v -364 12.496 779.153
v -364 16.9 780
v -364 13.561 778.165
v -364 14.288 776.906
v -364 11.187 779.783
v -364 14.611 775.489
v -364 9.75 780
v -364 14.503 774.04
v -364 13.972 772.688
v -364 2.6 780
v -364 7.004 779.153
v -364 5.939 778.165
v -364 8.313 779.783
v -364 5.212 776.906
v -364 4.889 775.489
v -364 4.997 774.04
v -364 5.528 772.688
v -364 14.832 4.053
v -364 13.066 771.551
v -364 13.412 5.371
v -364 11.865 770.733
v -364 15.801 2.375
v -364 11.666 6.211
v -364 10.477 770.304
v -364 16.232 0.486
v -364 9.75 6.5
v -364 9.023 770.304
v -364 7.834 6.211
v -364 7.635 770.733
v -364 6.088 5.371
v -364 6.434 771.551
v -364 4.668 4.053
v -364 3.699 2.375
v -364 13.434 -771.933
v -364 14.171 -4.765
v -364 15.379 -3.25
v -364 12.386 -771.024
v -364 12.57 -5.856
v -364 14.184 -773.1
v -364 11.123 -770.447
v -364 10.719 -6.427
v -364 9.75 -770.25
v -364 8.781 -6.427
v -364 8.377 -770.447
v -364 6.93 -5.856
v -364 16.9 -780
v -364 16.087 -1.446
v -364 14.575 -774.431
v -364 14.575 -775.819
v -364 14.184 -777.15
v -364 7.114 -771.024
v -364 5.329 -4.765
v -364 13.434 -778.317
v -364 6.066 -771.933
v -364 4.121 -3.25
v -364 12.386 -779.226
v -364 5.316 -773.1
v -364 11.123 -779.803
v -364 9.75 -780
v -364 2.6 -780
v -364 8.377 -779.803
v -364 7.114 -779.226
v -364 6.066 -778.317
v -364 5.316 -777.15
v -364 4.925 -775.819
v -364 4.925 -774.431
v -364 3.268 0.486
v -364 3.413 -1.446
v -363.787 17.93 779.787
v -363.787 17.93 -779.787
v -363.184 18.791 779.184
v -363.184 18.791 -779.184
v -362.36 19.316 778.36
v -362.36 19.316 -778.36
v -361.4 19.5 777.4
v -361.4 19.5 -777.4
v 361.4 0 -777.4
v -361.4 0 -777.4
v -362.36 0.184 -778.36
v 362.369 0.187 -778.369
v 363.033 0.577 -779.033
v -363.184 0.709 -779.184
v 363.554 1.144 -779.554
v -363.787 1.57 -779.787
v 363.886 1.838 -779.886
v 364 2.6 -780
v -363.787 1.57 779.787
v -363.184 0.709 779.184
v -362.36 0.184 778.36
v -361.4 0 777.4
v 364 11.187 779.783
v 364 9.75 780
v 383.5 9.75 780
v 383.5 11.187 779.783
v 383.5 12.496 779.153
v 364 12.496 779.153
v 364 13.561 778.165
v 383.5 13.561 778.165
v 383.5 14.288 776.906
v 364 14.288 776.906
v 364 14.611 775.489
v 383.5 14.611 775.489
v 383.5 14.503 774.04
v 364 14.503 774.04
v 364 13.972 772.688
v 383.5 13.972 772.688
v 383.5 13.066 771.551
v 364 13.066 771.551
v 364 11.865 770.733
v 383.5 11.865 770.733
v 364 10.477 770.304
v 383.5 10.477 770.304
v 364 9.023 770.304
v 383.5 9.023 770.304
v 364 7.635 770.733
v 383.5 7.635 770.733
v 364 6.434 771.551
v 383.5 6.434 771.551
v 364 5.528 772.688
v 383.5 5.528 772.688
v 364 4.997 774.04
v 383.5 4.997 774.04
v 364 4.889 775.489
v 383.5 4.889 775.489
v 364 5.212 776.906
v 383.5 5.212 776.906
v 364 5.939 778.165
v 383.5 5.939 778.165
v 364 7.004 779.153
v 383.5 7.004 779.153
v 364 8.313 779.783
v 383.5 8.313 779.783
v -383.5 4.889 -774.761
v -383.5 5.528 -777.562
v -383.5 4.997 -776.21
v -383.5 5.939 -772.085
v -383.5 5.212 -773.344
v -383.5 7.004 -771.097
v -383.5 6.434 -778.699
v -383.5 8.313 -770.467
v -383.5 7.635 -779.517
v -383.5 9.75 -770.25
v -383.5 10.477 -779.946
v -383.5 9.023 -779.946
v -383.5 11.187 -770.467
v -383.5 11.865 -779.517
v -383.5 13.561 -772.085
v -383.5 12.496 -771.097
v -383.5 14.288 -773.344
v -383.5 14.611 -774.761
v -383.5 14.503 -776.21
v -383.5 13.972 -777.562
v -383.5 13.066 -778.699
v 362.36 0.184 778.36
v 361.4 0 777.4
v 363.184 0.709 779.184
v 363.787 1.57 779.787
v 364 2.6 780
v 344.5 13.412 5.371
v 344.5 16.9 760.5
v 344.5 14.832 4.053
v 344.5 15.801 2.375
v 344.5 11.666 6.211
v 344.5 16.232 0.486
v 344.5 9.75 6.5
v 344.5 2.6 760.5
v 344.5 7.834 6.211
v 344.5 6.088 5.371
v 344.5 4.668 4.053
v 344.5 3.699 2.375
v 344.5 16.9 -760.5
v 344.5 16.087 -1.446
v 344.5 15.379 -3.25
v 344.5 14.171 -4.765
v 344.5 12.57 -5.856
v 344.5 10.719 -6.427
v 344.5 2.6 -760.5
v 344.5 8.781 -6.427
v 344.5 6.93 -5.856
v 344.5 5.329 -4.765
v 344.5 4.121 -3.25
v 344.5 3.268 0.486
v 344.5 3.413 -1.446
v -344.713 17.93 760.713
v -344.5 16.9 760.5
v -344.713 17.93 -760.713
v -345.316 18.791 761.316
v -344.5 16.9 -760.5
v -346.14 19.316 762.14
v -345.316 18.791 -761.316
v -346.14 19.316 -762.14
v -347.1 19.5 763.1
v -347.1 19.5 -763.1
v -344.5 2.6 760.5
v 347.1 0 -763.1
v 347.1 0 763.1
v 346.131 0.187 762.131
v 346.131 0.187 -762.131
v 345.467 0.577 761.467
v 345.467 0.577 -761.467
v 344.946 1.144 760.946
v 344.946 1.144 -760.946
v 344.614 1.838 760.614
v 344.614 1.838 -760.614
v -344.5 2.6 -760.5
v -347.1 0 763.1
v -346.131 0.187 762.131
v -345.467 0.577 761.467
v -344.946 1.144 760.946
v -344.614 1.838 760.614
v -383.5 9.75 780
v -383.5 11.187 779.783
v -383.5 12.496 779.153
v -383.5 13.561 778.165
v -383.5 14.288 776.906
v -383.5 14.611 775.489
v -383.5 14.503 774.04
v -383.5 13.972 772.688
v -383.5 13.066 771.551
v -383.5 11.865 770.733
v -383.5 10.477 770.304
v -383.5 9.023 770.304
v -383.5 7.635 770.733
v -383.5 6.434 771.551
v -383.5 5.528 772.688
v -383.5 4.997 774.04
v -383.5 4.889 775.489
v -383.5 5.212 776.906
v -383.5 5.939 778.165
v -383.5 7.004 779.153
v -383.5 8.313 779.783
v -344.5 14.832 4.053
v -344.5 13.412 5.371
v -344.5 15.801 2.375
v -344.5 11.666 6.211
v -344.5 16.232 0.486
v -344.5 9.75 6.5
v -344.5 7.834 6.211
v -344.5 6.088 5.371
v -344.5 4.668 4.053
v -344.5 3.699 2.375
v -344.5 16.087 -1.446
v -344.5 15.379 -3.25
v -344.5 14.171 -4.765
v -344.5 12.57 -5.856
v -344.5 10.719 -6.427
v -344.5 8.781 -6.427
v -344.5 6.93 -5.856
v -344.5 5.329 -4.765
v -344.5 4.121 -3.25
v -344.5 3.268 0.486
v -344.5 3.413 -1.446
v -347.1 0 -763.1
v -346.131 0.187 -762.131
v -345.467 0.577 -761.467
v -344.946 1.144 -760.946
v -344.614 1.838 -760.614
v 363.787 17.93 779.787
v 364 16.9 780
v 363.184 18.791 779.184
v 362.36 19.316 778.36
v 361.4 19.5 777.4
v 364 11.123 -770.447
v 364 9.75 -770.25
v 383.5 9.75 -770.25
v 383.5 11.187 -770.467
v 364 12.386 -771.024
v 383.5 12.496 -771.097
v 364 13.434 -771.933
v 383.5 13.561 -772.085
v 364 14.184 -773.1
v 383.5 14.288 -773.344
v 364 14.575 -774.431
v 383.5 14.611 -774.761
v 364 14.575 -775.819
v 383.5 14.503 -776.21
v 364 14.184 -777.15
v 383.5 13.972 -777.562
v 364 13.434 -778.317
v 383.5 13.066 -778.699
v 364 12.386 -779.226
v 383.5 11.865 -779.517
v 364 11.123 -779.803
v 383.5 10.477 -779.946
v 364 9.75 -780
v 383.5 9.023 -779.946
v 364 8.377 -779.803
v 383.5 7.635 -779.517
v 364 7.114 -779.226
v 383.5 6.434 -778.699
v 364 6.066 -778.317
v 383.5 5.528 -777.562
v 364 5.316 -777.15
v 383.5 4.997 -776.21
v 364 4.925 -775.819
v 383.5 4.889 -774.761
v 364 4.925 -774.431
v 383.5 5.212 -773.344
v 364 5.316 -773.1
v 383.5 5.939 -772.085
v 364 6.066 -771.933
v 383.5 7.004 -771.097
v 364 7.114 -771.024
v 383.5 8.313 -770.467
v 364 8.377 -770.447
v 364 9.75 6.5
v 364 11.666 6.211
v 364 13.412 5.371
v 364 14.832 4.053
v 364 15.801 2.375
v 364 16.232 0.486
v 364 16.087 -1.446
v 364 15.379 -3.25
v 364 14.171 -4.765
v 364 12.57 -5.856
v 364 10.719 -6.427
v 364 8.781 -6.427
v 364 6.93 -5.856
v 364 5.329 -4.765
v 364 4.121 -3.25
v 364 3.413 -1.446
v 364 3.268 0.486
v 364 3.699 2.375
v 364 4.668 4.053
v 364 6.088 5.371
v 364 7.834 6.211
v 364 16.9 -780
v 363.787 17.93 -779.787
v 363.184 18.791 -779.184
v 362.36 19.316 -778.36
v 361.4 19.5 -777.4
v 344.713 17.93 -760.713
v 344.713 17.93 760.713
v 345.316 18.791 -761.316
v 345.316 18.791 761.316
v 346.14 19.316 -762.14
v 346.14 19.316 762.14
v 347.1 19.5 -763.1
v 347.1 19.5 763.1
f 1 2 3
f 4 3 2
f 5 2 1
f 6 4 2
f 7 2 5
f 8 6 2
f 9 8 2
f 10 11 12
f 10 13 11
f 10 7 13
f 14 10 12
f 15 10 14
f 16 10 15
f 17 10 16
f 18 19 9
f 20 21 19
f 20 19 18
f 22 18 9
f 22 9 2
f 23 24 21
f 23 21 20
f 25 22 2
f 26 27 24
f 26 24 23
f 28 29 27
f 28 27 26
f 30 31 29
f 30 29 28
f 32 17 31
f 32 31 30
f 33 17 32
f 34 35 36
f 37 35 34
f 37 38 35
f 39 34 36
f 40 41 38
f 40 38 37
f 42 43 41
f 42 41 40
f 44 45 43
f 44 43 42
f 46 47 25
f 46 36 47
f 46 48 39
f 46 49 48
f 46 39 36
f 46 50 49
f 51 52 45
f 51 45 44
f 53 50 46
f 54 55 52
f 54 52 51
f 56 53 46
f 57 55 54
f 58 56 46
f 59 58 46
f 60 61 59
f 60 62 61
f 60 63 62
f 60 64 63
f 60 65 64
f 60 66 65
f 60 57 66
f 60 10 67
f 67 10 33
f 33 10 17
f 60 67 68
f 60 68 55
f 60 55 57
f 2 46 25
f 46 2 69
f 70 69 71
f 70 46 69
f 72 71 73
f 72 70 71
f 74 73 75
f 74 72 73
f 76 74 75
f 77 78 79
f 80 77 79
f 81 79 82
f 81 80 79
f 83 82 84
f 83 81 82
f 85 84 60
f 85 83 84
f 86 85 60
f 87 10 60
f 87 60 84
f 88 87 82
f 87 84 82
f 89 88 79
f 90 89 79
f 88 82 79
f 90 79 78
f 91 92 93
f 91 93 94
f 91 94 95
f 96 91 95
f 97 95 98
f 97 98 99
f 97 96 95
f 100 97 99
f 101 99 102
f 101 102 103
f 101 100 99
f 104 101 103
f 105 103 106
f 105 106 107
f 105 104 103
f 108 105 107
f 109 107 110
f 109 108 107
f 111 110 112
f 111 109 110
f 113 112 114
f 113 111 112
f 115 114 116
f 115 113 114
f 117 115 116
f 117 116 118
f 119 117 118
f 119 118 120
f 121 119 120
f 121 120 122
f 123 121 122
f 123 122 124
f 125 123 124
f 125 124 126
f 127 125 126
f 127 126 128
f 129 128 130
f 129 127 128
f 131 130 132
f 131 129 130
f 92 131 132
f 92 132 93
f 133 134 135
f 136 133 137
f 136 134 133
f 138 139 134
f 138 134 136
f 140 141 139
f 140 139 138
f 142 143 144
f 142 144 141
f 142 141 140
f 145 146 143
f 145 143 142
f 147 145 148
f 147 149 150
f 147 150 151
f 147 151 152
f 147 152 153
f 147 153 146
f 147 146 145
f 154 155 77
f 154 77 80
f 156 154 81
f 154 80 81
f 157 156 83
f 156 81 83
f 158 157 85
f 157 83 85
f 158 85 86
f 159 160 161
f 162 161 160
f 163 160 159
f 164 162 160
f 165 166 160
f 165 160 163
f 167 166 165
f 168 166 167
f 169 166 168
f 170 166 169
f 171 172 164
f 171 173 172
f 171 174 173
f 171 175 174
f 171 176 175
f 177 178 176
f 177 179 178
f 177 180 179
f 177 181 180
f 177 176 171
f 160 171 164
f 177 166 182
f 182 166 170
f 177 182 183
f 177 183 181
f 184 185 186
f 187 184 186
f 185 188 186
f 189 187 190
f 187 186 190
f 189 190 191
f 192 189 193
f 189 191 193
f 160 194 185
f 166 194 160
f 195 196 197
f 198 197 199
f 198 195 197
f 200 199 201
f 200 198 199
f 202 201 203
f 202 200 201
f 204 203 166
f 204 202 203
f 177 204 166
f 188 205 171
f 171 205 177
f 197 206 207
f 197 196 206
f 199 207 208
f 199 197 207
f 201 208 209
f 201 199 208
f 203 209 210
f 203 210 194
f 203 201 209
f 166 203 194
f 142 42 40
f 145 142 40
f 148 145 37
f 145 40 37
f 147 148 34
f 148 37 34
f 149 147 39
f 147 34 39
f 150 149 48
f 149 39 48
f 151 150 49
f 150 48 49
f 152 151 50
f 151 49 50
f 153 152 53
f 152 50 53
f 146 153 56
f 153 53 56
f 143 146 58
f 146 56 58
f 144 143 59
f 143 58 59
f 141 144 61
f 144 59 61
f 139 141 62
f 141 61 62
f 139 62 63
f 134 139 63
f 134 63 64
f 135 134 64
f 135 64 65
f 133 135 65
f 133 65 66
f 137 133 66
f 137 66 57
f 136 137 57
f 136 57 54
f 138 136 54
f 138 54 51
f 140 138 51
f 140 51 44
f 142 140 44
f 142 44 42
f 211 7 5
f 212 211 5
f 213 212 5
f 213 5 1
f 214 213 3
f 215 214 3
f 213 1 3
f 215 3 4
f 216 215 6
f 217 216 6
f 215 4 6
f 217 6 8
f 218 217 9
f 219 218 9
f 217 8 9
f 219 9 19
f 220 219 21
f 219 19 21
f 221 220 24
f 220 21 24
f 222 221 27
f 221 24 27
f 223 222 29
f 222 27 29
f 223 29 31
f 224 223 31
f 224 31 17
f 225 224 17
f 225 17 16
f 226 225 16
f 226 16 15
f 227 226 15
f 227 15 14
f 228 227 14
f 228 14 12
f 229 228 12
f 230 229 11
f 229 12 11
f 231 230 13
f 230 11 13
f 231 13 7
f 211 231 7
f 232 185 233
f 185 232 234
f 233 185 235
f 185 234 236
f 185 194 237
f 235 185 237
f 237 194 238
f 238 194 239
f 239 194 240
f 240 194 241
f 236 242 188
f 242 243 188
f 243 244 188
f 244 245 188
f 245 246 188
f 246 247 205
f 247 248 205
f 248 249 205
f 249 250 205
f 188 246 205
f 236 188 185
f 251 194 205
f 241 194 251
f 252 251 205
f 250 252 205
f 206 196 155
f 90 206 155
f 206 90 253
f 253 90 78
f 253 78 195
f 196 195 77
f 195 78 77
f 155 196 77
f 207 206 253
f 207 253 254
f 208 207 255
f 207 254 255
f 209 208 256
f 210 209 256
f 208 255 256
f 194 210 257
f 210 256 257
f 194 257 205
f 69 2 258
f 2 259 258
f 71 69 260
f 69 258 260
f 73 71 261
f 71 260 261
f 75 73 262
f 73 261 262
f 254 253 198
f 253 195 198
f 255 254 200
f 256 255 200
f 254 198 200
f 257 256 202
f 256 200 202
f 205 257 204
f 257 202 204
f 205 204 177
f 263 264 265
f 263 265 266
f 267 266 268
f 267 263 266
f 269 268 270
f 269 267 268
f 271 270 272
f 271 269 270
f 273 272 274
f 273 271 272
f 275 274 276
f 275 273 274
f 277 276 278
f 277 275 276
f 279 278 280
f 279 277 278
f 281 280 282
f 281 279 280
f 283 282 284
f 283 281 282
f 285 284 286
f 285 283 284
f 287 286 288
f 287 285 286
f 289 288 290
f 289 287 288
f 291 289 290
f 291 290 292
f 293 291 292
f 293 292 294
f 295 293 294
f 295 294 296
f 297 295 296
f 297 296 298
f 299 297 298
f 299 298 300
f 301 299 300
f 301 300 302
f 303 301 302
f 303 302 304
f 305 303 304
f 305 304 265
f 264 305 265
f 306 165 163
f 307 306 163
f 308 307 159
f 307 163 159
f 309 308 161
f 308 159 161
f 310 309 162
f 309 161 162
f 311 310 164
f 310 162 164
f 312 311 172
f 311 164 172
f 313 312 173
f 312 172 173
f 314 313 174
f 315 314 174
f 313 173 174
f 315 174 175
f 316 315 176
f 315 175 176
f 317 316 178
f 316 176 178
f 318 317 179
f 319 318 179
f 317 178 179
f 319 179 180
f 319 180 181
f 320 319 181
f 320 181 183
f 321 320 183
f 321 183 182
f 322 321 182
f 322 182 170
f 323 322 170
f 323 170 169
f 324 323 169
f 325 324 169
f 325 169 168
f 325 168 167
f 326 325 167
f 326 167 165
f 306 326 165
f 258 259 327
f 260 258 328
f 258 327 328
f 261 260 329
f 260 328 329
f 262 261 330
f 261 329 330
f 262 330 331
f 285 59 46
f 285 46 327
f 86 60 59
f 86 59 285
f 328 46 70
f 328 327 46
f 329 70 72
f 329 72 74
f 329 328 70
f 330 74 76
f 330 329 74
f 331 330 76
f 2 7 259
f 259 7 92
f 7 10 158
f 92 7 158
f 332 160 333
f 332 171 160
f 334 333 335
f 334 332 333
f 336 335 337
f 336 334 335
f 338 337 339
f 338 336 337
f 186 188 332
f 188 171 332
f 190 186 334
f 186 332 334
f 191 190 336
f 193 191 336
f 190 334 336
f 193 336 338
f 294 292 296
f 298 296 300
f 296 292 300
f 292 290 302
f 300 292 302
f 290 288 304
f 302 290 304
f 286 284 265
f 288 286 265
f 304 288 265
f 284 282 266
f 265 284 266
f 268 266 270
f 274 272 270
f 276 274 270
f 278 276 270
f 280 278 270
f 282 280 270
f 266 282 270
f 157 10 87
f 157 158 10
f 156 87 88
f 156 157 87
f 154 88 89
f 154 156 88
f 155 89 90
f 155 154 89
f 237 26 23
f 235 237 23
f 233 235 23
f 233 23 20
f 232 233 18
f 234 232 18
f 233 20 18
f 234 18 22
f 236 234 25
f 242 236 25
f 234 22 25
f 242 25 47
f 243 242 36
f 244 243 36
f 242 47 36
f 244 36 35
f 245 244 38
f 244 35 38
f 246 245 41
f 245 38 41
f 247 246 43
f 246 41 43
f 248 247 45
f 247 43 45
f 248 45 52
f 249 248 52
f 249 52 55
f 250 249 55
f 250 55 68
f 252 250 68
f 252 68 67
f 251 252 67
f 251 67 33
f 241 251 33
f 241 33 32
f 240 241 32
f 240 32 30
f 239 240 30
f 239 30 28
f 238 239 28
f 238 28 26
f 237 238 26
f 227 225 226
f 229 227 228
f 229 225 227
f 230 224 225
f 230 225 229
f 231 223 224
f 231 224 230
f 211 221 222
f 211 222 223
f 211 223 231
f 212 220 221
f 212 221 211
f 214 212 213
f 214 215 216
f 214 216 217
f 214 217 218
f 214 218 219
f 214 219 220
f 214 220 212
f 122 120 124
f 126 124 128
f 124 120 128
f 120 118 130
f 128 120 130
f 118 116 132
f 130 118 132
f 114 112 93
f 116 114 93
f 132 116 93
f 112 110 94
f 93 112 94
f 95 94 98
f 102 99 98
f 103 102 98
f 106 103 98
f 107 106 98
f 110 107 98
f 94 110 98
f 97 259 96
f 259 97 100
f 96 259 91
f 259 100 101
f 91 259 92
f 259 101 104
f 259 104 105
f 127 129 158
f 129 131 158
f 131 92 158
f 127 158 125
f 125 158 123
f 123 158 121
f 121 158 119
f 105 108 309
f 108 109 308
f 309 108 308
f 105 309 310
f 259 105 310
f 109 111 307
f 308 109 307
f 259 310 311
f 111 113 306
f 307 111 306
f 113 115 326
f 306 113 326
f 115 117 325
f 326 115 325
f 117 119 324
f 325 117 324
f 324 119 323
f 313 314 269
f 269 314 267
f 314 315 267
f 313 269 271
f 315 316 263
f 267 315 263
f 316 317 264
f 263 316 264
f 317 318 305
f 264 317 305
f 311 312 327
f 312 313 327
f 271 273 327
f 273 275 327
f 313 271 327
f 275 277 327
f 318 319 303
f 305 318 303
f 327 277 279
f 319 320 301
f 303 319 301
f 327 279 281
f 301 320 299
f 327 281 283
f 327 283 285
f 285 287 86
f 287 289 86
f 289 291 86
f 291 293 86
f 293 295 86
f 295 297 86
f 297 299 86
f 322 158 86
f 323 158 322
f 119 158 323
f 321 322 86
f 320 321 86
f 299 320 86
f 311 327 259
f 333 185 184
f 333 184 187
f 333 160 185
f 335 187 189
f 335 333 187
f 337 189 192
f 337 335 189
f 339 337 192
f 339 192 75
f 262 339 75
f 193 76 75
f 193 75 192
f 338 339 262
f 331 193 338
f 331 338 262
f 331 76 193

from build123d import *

# Parameters (mm, degrees)
CROQUIS1_W              = 560
CROQUIS1_H              = 1200
CROQUIS1_W_2            = 530
CROQUIS1_H_2            = 1170
SALIENTE_EXTRUIR1_DEPTH = 15
REDONDEO1_R             = 2
REDONDEO2_R             = 2
CROQUIS2_R              = 3.75
SALIENTE_EXTRUIR2_DEPTH = 15
CROQUIS3_R              = 5
CORTAR_EXTRUIR1_DEPTH   = 576
ESCALA1_SCALE           = 1.3


with BuildPart() as part:
    # Croquis1 → Saliente-Extruir1 (new body)
    with BuildSketch(Plane(origin=(0, 0, 0), x_dir=(1, 0, 0), z_dir=(0, 1, 0))):
        Rectangle(CROQUIS1_W, CROQUIS1_H)
        Rectangle(CROQUIS1_W_2, CROQUIS1_H_2, mode=Mode.SUBTRACT)
    extrude(amount=SALIENTE_EXTRUIR1_DEPTH)

    # Redondeo1
    redondeo1_edges = [part.edges().sort_by_distance(p)[0] for p in [
        (-280, 15, 0),
        (265, 15, 0),
        (0, 15, 600),
        (0, 15, -585),
        (-265, 15, 0),
        (0, 15, 585),
        (280, 15, 0),
        (0, 15, -600),
    ]]
    fillet(redondeo1_edges, radius=REDONDEO1_R)

    # Redondeo2
    redondeo2_edges = [part.edges().sort_by_distance(p)[0] for p in [
        (265, 0, 0),
        (0, 0, -585),
        (-265, 0, 0),
        (0, 0, 585),
        (0, 0, 600),
        (-280, 0, 0),
        (0, 0, -600),
        (280, 0, 0),
    ]]
    fillet(redondeo2_edges, radius=REDONDEO2_R)

    # Croquis2 → Saliente-Extruir2 (add)
    with BuildSketch(Plane.ZY.offset(280)):
        with Locations((596.25, 7.5)):
            Circle(CROQUIS2_R)
        with Locations((-596.25, 7.5)):
            Circle(CROQUIS2_R)
    saliente_extruir2 = extrude(amount=SALIENTE_EXTRUIR2_DEPTH)

    # Simetría1: Saliente-Extruir2 across plane
    add(saliente_extruir2.mirror(Plane(origin=(0, 0, 0), x_dir=(0, 0, 1), z_dir=(1, 0, 0))))

    # Croquis3 → Cortar-Extruir1 (cut, through all)
    with BuildSketch(Plane.ZY.offset(280)):
        with Locations((0, 7.5)):
            Circle(CROQUIS3_R)
    extrude(amount=-CORTAR_EXTRUIR1_DEPTH, mode=Mode.SUBTRACT)


with BuildPart() as part_1:
    # Escala1: scaled about (0, 0, 0)
    add(part.part.scale(ESCALA1_SCALE))


solid = part_1.part
